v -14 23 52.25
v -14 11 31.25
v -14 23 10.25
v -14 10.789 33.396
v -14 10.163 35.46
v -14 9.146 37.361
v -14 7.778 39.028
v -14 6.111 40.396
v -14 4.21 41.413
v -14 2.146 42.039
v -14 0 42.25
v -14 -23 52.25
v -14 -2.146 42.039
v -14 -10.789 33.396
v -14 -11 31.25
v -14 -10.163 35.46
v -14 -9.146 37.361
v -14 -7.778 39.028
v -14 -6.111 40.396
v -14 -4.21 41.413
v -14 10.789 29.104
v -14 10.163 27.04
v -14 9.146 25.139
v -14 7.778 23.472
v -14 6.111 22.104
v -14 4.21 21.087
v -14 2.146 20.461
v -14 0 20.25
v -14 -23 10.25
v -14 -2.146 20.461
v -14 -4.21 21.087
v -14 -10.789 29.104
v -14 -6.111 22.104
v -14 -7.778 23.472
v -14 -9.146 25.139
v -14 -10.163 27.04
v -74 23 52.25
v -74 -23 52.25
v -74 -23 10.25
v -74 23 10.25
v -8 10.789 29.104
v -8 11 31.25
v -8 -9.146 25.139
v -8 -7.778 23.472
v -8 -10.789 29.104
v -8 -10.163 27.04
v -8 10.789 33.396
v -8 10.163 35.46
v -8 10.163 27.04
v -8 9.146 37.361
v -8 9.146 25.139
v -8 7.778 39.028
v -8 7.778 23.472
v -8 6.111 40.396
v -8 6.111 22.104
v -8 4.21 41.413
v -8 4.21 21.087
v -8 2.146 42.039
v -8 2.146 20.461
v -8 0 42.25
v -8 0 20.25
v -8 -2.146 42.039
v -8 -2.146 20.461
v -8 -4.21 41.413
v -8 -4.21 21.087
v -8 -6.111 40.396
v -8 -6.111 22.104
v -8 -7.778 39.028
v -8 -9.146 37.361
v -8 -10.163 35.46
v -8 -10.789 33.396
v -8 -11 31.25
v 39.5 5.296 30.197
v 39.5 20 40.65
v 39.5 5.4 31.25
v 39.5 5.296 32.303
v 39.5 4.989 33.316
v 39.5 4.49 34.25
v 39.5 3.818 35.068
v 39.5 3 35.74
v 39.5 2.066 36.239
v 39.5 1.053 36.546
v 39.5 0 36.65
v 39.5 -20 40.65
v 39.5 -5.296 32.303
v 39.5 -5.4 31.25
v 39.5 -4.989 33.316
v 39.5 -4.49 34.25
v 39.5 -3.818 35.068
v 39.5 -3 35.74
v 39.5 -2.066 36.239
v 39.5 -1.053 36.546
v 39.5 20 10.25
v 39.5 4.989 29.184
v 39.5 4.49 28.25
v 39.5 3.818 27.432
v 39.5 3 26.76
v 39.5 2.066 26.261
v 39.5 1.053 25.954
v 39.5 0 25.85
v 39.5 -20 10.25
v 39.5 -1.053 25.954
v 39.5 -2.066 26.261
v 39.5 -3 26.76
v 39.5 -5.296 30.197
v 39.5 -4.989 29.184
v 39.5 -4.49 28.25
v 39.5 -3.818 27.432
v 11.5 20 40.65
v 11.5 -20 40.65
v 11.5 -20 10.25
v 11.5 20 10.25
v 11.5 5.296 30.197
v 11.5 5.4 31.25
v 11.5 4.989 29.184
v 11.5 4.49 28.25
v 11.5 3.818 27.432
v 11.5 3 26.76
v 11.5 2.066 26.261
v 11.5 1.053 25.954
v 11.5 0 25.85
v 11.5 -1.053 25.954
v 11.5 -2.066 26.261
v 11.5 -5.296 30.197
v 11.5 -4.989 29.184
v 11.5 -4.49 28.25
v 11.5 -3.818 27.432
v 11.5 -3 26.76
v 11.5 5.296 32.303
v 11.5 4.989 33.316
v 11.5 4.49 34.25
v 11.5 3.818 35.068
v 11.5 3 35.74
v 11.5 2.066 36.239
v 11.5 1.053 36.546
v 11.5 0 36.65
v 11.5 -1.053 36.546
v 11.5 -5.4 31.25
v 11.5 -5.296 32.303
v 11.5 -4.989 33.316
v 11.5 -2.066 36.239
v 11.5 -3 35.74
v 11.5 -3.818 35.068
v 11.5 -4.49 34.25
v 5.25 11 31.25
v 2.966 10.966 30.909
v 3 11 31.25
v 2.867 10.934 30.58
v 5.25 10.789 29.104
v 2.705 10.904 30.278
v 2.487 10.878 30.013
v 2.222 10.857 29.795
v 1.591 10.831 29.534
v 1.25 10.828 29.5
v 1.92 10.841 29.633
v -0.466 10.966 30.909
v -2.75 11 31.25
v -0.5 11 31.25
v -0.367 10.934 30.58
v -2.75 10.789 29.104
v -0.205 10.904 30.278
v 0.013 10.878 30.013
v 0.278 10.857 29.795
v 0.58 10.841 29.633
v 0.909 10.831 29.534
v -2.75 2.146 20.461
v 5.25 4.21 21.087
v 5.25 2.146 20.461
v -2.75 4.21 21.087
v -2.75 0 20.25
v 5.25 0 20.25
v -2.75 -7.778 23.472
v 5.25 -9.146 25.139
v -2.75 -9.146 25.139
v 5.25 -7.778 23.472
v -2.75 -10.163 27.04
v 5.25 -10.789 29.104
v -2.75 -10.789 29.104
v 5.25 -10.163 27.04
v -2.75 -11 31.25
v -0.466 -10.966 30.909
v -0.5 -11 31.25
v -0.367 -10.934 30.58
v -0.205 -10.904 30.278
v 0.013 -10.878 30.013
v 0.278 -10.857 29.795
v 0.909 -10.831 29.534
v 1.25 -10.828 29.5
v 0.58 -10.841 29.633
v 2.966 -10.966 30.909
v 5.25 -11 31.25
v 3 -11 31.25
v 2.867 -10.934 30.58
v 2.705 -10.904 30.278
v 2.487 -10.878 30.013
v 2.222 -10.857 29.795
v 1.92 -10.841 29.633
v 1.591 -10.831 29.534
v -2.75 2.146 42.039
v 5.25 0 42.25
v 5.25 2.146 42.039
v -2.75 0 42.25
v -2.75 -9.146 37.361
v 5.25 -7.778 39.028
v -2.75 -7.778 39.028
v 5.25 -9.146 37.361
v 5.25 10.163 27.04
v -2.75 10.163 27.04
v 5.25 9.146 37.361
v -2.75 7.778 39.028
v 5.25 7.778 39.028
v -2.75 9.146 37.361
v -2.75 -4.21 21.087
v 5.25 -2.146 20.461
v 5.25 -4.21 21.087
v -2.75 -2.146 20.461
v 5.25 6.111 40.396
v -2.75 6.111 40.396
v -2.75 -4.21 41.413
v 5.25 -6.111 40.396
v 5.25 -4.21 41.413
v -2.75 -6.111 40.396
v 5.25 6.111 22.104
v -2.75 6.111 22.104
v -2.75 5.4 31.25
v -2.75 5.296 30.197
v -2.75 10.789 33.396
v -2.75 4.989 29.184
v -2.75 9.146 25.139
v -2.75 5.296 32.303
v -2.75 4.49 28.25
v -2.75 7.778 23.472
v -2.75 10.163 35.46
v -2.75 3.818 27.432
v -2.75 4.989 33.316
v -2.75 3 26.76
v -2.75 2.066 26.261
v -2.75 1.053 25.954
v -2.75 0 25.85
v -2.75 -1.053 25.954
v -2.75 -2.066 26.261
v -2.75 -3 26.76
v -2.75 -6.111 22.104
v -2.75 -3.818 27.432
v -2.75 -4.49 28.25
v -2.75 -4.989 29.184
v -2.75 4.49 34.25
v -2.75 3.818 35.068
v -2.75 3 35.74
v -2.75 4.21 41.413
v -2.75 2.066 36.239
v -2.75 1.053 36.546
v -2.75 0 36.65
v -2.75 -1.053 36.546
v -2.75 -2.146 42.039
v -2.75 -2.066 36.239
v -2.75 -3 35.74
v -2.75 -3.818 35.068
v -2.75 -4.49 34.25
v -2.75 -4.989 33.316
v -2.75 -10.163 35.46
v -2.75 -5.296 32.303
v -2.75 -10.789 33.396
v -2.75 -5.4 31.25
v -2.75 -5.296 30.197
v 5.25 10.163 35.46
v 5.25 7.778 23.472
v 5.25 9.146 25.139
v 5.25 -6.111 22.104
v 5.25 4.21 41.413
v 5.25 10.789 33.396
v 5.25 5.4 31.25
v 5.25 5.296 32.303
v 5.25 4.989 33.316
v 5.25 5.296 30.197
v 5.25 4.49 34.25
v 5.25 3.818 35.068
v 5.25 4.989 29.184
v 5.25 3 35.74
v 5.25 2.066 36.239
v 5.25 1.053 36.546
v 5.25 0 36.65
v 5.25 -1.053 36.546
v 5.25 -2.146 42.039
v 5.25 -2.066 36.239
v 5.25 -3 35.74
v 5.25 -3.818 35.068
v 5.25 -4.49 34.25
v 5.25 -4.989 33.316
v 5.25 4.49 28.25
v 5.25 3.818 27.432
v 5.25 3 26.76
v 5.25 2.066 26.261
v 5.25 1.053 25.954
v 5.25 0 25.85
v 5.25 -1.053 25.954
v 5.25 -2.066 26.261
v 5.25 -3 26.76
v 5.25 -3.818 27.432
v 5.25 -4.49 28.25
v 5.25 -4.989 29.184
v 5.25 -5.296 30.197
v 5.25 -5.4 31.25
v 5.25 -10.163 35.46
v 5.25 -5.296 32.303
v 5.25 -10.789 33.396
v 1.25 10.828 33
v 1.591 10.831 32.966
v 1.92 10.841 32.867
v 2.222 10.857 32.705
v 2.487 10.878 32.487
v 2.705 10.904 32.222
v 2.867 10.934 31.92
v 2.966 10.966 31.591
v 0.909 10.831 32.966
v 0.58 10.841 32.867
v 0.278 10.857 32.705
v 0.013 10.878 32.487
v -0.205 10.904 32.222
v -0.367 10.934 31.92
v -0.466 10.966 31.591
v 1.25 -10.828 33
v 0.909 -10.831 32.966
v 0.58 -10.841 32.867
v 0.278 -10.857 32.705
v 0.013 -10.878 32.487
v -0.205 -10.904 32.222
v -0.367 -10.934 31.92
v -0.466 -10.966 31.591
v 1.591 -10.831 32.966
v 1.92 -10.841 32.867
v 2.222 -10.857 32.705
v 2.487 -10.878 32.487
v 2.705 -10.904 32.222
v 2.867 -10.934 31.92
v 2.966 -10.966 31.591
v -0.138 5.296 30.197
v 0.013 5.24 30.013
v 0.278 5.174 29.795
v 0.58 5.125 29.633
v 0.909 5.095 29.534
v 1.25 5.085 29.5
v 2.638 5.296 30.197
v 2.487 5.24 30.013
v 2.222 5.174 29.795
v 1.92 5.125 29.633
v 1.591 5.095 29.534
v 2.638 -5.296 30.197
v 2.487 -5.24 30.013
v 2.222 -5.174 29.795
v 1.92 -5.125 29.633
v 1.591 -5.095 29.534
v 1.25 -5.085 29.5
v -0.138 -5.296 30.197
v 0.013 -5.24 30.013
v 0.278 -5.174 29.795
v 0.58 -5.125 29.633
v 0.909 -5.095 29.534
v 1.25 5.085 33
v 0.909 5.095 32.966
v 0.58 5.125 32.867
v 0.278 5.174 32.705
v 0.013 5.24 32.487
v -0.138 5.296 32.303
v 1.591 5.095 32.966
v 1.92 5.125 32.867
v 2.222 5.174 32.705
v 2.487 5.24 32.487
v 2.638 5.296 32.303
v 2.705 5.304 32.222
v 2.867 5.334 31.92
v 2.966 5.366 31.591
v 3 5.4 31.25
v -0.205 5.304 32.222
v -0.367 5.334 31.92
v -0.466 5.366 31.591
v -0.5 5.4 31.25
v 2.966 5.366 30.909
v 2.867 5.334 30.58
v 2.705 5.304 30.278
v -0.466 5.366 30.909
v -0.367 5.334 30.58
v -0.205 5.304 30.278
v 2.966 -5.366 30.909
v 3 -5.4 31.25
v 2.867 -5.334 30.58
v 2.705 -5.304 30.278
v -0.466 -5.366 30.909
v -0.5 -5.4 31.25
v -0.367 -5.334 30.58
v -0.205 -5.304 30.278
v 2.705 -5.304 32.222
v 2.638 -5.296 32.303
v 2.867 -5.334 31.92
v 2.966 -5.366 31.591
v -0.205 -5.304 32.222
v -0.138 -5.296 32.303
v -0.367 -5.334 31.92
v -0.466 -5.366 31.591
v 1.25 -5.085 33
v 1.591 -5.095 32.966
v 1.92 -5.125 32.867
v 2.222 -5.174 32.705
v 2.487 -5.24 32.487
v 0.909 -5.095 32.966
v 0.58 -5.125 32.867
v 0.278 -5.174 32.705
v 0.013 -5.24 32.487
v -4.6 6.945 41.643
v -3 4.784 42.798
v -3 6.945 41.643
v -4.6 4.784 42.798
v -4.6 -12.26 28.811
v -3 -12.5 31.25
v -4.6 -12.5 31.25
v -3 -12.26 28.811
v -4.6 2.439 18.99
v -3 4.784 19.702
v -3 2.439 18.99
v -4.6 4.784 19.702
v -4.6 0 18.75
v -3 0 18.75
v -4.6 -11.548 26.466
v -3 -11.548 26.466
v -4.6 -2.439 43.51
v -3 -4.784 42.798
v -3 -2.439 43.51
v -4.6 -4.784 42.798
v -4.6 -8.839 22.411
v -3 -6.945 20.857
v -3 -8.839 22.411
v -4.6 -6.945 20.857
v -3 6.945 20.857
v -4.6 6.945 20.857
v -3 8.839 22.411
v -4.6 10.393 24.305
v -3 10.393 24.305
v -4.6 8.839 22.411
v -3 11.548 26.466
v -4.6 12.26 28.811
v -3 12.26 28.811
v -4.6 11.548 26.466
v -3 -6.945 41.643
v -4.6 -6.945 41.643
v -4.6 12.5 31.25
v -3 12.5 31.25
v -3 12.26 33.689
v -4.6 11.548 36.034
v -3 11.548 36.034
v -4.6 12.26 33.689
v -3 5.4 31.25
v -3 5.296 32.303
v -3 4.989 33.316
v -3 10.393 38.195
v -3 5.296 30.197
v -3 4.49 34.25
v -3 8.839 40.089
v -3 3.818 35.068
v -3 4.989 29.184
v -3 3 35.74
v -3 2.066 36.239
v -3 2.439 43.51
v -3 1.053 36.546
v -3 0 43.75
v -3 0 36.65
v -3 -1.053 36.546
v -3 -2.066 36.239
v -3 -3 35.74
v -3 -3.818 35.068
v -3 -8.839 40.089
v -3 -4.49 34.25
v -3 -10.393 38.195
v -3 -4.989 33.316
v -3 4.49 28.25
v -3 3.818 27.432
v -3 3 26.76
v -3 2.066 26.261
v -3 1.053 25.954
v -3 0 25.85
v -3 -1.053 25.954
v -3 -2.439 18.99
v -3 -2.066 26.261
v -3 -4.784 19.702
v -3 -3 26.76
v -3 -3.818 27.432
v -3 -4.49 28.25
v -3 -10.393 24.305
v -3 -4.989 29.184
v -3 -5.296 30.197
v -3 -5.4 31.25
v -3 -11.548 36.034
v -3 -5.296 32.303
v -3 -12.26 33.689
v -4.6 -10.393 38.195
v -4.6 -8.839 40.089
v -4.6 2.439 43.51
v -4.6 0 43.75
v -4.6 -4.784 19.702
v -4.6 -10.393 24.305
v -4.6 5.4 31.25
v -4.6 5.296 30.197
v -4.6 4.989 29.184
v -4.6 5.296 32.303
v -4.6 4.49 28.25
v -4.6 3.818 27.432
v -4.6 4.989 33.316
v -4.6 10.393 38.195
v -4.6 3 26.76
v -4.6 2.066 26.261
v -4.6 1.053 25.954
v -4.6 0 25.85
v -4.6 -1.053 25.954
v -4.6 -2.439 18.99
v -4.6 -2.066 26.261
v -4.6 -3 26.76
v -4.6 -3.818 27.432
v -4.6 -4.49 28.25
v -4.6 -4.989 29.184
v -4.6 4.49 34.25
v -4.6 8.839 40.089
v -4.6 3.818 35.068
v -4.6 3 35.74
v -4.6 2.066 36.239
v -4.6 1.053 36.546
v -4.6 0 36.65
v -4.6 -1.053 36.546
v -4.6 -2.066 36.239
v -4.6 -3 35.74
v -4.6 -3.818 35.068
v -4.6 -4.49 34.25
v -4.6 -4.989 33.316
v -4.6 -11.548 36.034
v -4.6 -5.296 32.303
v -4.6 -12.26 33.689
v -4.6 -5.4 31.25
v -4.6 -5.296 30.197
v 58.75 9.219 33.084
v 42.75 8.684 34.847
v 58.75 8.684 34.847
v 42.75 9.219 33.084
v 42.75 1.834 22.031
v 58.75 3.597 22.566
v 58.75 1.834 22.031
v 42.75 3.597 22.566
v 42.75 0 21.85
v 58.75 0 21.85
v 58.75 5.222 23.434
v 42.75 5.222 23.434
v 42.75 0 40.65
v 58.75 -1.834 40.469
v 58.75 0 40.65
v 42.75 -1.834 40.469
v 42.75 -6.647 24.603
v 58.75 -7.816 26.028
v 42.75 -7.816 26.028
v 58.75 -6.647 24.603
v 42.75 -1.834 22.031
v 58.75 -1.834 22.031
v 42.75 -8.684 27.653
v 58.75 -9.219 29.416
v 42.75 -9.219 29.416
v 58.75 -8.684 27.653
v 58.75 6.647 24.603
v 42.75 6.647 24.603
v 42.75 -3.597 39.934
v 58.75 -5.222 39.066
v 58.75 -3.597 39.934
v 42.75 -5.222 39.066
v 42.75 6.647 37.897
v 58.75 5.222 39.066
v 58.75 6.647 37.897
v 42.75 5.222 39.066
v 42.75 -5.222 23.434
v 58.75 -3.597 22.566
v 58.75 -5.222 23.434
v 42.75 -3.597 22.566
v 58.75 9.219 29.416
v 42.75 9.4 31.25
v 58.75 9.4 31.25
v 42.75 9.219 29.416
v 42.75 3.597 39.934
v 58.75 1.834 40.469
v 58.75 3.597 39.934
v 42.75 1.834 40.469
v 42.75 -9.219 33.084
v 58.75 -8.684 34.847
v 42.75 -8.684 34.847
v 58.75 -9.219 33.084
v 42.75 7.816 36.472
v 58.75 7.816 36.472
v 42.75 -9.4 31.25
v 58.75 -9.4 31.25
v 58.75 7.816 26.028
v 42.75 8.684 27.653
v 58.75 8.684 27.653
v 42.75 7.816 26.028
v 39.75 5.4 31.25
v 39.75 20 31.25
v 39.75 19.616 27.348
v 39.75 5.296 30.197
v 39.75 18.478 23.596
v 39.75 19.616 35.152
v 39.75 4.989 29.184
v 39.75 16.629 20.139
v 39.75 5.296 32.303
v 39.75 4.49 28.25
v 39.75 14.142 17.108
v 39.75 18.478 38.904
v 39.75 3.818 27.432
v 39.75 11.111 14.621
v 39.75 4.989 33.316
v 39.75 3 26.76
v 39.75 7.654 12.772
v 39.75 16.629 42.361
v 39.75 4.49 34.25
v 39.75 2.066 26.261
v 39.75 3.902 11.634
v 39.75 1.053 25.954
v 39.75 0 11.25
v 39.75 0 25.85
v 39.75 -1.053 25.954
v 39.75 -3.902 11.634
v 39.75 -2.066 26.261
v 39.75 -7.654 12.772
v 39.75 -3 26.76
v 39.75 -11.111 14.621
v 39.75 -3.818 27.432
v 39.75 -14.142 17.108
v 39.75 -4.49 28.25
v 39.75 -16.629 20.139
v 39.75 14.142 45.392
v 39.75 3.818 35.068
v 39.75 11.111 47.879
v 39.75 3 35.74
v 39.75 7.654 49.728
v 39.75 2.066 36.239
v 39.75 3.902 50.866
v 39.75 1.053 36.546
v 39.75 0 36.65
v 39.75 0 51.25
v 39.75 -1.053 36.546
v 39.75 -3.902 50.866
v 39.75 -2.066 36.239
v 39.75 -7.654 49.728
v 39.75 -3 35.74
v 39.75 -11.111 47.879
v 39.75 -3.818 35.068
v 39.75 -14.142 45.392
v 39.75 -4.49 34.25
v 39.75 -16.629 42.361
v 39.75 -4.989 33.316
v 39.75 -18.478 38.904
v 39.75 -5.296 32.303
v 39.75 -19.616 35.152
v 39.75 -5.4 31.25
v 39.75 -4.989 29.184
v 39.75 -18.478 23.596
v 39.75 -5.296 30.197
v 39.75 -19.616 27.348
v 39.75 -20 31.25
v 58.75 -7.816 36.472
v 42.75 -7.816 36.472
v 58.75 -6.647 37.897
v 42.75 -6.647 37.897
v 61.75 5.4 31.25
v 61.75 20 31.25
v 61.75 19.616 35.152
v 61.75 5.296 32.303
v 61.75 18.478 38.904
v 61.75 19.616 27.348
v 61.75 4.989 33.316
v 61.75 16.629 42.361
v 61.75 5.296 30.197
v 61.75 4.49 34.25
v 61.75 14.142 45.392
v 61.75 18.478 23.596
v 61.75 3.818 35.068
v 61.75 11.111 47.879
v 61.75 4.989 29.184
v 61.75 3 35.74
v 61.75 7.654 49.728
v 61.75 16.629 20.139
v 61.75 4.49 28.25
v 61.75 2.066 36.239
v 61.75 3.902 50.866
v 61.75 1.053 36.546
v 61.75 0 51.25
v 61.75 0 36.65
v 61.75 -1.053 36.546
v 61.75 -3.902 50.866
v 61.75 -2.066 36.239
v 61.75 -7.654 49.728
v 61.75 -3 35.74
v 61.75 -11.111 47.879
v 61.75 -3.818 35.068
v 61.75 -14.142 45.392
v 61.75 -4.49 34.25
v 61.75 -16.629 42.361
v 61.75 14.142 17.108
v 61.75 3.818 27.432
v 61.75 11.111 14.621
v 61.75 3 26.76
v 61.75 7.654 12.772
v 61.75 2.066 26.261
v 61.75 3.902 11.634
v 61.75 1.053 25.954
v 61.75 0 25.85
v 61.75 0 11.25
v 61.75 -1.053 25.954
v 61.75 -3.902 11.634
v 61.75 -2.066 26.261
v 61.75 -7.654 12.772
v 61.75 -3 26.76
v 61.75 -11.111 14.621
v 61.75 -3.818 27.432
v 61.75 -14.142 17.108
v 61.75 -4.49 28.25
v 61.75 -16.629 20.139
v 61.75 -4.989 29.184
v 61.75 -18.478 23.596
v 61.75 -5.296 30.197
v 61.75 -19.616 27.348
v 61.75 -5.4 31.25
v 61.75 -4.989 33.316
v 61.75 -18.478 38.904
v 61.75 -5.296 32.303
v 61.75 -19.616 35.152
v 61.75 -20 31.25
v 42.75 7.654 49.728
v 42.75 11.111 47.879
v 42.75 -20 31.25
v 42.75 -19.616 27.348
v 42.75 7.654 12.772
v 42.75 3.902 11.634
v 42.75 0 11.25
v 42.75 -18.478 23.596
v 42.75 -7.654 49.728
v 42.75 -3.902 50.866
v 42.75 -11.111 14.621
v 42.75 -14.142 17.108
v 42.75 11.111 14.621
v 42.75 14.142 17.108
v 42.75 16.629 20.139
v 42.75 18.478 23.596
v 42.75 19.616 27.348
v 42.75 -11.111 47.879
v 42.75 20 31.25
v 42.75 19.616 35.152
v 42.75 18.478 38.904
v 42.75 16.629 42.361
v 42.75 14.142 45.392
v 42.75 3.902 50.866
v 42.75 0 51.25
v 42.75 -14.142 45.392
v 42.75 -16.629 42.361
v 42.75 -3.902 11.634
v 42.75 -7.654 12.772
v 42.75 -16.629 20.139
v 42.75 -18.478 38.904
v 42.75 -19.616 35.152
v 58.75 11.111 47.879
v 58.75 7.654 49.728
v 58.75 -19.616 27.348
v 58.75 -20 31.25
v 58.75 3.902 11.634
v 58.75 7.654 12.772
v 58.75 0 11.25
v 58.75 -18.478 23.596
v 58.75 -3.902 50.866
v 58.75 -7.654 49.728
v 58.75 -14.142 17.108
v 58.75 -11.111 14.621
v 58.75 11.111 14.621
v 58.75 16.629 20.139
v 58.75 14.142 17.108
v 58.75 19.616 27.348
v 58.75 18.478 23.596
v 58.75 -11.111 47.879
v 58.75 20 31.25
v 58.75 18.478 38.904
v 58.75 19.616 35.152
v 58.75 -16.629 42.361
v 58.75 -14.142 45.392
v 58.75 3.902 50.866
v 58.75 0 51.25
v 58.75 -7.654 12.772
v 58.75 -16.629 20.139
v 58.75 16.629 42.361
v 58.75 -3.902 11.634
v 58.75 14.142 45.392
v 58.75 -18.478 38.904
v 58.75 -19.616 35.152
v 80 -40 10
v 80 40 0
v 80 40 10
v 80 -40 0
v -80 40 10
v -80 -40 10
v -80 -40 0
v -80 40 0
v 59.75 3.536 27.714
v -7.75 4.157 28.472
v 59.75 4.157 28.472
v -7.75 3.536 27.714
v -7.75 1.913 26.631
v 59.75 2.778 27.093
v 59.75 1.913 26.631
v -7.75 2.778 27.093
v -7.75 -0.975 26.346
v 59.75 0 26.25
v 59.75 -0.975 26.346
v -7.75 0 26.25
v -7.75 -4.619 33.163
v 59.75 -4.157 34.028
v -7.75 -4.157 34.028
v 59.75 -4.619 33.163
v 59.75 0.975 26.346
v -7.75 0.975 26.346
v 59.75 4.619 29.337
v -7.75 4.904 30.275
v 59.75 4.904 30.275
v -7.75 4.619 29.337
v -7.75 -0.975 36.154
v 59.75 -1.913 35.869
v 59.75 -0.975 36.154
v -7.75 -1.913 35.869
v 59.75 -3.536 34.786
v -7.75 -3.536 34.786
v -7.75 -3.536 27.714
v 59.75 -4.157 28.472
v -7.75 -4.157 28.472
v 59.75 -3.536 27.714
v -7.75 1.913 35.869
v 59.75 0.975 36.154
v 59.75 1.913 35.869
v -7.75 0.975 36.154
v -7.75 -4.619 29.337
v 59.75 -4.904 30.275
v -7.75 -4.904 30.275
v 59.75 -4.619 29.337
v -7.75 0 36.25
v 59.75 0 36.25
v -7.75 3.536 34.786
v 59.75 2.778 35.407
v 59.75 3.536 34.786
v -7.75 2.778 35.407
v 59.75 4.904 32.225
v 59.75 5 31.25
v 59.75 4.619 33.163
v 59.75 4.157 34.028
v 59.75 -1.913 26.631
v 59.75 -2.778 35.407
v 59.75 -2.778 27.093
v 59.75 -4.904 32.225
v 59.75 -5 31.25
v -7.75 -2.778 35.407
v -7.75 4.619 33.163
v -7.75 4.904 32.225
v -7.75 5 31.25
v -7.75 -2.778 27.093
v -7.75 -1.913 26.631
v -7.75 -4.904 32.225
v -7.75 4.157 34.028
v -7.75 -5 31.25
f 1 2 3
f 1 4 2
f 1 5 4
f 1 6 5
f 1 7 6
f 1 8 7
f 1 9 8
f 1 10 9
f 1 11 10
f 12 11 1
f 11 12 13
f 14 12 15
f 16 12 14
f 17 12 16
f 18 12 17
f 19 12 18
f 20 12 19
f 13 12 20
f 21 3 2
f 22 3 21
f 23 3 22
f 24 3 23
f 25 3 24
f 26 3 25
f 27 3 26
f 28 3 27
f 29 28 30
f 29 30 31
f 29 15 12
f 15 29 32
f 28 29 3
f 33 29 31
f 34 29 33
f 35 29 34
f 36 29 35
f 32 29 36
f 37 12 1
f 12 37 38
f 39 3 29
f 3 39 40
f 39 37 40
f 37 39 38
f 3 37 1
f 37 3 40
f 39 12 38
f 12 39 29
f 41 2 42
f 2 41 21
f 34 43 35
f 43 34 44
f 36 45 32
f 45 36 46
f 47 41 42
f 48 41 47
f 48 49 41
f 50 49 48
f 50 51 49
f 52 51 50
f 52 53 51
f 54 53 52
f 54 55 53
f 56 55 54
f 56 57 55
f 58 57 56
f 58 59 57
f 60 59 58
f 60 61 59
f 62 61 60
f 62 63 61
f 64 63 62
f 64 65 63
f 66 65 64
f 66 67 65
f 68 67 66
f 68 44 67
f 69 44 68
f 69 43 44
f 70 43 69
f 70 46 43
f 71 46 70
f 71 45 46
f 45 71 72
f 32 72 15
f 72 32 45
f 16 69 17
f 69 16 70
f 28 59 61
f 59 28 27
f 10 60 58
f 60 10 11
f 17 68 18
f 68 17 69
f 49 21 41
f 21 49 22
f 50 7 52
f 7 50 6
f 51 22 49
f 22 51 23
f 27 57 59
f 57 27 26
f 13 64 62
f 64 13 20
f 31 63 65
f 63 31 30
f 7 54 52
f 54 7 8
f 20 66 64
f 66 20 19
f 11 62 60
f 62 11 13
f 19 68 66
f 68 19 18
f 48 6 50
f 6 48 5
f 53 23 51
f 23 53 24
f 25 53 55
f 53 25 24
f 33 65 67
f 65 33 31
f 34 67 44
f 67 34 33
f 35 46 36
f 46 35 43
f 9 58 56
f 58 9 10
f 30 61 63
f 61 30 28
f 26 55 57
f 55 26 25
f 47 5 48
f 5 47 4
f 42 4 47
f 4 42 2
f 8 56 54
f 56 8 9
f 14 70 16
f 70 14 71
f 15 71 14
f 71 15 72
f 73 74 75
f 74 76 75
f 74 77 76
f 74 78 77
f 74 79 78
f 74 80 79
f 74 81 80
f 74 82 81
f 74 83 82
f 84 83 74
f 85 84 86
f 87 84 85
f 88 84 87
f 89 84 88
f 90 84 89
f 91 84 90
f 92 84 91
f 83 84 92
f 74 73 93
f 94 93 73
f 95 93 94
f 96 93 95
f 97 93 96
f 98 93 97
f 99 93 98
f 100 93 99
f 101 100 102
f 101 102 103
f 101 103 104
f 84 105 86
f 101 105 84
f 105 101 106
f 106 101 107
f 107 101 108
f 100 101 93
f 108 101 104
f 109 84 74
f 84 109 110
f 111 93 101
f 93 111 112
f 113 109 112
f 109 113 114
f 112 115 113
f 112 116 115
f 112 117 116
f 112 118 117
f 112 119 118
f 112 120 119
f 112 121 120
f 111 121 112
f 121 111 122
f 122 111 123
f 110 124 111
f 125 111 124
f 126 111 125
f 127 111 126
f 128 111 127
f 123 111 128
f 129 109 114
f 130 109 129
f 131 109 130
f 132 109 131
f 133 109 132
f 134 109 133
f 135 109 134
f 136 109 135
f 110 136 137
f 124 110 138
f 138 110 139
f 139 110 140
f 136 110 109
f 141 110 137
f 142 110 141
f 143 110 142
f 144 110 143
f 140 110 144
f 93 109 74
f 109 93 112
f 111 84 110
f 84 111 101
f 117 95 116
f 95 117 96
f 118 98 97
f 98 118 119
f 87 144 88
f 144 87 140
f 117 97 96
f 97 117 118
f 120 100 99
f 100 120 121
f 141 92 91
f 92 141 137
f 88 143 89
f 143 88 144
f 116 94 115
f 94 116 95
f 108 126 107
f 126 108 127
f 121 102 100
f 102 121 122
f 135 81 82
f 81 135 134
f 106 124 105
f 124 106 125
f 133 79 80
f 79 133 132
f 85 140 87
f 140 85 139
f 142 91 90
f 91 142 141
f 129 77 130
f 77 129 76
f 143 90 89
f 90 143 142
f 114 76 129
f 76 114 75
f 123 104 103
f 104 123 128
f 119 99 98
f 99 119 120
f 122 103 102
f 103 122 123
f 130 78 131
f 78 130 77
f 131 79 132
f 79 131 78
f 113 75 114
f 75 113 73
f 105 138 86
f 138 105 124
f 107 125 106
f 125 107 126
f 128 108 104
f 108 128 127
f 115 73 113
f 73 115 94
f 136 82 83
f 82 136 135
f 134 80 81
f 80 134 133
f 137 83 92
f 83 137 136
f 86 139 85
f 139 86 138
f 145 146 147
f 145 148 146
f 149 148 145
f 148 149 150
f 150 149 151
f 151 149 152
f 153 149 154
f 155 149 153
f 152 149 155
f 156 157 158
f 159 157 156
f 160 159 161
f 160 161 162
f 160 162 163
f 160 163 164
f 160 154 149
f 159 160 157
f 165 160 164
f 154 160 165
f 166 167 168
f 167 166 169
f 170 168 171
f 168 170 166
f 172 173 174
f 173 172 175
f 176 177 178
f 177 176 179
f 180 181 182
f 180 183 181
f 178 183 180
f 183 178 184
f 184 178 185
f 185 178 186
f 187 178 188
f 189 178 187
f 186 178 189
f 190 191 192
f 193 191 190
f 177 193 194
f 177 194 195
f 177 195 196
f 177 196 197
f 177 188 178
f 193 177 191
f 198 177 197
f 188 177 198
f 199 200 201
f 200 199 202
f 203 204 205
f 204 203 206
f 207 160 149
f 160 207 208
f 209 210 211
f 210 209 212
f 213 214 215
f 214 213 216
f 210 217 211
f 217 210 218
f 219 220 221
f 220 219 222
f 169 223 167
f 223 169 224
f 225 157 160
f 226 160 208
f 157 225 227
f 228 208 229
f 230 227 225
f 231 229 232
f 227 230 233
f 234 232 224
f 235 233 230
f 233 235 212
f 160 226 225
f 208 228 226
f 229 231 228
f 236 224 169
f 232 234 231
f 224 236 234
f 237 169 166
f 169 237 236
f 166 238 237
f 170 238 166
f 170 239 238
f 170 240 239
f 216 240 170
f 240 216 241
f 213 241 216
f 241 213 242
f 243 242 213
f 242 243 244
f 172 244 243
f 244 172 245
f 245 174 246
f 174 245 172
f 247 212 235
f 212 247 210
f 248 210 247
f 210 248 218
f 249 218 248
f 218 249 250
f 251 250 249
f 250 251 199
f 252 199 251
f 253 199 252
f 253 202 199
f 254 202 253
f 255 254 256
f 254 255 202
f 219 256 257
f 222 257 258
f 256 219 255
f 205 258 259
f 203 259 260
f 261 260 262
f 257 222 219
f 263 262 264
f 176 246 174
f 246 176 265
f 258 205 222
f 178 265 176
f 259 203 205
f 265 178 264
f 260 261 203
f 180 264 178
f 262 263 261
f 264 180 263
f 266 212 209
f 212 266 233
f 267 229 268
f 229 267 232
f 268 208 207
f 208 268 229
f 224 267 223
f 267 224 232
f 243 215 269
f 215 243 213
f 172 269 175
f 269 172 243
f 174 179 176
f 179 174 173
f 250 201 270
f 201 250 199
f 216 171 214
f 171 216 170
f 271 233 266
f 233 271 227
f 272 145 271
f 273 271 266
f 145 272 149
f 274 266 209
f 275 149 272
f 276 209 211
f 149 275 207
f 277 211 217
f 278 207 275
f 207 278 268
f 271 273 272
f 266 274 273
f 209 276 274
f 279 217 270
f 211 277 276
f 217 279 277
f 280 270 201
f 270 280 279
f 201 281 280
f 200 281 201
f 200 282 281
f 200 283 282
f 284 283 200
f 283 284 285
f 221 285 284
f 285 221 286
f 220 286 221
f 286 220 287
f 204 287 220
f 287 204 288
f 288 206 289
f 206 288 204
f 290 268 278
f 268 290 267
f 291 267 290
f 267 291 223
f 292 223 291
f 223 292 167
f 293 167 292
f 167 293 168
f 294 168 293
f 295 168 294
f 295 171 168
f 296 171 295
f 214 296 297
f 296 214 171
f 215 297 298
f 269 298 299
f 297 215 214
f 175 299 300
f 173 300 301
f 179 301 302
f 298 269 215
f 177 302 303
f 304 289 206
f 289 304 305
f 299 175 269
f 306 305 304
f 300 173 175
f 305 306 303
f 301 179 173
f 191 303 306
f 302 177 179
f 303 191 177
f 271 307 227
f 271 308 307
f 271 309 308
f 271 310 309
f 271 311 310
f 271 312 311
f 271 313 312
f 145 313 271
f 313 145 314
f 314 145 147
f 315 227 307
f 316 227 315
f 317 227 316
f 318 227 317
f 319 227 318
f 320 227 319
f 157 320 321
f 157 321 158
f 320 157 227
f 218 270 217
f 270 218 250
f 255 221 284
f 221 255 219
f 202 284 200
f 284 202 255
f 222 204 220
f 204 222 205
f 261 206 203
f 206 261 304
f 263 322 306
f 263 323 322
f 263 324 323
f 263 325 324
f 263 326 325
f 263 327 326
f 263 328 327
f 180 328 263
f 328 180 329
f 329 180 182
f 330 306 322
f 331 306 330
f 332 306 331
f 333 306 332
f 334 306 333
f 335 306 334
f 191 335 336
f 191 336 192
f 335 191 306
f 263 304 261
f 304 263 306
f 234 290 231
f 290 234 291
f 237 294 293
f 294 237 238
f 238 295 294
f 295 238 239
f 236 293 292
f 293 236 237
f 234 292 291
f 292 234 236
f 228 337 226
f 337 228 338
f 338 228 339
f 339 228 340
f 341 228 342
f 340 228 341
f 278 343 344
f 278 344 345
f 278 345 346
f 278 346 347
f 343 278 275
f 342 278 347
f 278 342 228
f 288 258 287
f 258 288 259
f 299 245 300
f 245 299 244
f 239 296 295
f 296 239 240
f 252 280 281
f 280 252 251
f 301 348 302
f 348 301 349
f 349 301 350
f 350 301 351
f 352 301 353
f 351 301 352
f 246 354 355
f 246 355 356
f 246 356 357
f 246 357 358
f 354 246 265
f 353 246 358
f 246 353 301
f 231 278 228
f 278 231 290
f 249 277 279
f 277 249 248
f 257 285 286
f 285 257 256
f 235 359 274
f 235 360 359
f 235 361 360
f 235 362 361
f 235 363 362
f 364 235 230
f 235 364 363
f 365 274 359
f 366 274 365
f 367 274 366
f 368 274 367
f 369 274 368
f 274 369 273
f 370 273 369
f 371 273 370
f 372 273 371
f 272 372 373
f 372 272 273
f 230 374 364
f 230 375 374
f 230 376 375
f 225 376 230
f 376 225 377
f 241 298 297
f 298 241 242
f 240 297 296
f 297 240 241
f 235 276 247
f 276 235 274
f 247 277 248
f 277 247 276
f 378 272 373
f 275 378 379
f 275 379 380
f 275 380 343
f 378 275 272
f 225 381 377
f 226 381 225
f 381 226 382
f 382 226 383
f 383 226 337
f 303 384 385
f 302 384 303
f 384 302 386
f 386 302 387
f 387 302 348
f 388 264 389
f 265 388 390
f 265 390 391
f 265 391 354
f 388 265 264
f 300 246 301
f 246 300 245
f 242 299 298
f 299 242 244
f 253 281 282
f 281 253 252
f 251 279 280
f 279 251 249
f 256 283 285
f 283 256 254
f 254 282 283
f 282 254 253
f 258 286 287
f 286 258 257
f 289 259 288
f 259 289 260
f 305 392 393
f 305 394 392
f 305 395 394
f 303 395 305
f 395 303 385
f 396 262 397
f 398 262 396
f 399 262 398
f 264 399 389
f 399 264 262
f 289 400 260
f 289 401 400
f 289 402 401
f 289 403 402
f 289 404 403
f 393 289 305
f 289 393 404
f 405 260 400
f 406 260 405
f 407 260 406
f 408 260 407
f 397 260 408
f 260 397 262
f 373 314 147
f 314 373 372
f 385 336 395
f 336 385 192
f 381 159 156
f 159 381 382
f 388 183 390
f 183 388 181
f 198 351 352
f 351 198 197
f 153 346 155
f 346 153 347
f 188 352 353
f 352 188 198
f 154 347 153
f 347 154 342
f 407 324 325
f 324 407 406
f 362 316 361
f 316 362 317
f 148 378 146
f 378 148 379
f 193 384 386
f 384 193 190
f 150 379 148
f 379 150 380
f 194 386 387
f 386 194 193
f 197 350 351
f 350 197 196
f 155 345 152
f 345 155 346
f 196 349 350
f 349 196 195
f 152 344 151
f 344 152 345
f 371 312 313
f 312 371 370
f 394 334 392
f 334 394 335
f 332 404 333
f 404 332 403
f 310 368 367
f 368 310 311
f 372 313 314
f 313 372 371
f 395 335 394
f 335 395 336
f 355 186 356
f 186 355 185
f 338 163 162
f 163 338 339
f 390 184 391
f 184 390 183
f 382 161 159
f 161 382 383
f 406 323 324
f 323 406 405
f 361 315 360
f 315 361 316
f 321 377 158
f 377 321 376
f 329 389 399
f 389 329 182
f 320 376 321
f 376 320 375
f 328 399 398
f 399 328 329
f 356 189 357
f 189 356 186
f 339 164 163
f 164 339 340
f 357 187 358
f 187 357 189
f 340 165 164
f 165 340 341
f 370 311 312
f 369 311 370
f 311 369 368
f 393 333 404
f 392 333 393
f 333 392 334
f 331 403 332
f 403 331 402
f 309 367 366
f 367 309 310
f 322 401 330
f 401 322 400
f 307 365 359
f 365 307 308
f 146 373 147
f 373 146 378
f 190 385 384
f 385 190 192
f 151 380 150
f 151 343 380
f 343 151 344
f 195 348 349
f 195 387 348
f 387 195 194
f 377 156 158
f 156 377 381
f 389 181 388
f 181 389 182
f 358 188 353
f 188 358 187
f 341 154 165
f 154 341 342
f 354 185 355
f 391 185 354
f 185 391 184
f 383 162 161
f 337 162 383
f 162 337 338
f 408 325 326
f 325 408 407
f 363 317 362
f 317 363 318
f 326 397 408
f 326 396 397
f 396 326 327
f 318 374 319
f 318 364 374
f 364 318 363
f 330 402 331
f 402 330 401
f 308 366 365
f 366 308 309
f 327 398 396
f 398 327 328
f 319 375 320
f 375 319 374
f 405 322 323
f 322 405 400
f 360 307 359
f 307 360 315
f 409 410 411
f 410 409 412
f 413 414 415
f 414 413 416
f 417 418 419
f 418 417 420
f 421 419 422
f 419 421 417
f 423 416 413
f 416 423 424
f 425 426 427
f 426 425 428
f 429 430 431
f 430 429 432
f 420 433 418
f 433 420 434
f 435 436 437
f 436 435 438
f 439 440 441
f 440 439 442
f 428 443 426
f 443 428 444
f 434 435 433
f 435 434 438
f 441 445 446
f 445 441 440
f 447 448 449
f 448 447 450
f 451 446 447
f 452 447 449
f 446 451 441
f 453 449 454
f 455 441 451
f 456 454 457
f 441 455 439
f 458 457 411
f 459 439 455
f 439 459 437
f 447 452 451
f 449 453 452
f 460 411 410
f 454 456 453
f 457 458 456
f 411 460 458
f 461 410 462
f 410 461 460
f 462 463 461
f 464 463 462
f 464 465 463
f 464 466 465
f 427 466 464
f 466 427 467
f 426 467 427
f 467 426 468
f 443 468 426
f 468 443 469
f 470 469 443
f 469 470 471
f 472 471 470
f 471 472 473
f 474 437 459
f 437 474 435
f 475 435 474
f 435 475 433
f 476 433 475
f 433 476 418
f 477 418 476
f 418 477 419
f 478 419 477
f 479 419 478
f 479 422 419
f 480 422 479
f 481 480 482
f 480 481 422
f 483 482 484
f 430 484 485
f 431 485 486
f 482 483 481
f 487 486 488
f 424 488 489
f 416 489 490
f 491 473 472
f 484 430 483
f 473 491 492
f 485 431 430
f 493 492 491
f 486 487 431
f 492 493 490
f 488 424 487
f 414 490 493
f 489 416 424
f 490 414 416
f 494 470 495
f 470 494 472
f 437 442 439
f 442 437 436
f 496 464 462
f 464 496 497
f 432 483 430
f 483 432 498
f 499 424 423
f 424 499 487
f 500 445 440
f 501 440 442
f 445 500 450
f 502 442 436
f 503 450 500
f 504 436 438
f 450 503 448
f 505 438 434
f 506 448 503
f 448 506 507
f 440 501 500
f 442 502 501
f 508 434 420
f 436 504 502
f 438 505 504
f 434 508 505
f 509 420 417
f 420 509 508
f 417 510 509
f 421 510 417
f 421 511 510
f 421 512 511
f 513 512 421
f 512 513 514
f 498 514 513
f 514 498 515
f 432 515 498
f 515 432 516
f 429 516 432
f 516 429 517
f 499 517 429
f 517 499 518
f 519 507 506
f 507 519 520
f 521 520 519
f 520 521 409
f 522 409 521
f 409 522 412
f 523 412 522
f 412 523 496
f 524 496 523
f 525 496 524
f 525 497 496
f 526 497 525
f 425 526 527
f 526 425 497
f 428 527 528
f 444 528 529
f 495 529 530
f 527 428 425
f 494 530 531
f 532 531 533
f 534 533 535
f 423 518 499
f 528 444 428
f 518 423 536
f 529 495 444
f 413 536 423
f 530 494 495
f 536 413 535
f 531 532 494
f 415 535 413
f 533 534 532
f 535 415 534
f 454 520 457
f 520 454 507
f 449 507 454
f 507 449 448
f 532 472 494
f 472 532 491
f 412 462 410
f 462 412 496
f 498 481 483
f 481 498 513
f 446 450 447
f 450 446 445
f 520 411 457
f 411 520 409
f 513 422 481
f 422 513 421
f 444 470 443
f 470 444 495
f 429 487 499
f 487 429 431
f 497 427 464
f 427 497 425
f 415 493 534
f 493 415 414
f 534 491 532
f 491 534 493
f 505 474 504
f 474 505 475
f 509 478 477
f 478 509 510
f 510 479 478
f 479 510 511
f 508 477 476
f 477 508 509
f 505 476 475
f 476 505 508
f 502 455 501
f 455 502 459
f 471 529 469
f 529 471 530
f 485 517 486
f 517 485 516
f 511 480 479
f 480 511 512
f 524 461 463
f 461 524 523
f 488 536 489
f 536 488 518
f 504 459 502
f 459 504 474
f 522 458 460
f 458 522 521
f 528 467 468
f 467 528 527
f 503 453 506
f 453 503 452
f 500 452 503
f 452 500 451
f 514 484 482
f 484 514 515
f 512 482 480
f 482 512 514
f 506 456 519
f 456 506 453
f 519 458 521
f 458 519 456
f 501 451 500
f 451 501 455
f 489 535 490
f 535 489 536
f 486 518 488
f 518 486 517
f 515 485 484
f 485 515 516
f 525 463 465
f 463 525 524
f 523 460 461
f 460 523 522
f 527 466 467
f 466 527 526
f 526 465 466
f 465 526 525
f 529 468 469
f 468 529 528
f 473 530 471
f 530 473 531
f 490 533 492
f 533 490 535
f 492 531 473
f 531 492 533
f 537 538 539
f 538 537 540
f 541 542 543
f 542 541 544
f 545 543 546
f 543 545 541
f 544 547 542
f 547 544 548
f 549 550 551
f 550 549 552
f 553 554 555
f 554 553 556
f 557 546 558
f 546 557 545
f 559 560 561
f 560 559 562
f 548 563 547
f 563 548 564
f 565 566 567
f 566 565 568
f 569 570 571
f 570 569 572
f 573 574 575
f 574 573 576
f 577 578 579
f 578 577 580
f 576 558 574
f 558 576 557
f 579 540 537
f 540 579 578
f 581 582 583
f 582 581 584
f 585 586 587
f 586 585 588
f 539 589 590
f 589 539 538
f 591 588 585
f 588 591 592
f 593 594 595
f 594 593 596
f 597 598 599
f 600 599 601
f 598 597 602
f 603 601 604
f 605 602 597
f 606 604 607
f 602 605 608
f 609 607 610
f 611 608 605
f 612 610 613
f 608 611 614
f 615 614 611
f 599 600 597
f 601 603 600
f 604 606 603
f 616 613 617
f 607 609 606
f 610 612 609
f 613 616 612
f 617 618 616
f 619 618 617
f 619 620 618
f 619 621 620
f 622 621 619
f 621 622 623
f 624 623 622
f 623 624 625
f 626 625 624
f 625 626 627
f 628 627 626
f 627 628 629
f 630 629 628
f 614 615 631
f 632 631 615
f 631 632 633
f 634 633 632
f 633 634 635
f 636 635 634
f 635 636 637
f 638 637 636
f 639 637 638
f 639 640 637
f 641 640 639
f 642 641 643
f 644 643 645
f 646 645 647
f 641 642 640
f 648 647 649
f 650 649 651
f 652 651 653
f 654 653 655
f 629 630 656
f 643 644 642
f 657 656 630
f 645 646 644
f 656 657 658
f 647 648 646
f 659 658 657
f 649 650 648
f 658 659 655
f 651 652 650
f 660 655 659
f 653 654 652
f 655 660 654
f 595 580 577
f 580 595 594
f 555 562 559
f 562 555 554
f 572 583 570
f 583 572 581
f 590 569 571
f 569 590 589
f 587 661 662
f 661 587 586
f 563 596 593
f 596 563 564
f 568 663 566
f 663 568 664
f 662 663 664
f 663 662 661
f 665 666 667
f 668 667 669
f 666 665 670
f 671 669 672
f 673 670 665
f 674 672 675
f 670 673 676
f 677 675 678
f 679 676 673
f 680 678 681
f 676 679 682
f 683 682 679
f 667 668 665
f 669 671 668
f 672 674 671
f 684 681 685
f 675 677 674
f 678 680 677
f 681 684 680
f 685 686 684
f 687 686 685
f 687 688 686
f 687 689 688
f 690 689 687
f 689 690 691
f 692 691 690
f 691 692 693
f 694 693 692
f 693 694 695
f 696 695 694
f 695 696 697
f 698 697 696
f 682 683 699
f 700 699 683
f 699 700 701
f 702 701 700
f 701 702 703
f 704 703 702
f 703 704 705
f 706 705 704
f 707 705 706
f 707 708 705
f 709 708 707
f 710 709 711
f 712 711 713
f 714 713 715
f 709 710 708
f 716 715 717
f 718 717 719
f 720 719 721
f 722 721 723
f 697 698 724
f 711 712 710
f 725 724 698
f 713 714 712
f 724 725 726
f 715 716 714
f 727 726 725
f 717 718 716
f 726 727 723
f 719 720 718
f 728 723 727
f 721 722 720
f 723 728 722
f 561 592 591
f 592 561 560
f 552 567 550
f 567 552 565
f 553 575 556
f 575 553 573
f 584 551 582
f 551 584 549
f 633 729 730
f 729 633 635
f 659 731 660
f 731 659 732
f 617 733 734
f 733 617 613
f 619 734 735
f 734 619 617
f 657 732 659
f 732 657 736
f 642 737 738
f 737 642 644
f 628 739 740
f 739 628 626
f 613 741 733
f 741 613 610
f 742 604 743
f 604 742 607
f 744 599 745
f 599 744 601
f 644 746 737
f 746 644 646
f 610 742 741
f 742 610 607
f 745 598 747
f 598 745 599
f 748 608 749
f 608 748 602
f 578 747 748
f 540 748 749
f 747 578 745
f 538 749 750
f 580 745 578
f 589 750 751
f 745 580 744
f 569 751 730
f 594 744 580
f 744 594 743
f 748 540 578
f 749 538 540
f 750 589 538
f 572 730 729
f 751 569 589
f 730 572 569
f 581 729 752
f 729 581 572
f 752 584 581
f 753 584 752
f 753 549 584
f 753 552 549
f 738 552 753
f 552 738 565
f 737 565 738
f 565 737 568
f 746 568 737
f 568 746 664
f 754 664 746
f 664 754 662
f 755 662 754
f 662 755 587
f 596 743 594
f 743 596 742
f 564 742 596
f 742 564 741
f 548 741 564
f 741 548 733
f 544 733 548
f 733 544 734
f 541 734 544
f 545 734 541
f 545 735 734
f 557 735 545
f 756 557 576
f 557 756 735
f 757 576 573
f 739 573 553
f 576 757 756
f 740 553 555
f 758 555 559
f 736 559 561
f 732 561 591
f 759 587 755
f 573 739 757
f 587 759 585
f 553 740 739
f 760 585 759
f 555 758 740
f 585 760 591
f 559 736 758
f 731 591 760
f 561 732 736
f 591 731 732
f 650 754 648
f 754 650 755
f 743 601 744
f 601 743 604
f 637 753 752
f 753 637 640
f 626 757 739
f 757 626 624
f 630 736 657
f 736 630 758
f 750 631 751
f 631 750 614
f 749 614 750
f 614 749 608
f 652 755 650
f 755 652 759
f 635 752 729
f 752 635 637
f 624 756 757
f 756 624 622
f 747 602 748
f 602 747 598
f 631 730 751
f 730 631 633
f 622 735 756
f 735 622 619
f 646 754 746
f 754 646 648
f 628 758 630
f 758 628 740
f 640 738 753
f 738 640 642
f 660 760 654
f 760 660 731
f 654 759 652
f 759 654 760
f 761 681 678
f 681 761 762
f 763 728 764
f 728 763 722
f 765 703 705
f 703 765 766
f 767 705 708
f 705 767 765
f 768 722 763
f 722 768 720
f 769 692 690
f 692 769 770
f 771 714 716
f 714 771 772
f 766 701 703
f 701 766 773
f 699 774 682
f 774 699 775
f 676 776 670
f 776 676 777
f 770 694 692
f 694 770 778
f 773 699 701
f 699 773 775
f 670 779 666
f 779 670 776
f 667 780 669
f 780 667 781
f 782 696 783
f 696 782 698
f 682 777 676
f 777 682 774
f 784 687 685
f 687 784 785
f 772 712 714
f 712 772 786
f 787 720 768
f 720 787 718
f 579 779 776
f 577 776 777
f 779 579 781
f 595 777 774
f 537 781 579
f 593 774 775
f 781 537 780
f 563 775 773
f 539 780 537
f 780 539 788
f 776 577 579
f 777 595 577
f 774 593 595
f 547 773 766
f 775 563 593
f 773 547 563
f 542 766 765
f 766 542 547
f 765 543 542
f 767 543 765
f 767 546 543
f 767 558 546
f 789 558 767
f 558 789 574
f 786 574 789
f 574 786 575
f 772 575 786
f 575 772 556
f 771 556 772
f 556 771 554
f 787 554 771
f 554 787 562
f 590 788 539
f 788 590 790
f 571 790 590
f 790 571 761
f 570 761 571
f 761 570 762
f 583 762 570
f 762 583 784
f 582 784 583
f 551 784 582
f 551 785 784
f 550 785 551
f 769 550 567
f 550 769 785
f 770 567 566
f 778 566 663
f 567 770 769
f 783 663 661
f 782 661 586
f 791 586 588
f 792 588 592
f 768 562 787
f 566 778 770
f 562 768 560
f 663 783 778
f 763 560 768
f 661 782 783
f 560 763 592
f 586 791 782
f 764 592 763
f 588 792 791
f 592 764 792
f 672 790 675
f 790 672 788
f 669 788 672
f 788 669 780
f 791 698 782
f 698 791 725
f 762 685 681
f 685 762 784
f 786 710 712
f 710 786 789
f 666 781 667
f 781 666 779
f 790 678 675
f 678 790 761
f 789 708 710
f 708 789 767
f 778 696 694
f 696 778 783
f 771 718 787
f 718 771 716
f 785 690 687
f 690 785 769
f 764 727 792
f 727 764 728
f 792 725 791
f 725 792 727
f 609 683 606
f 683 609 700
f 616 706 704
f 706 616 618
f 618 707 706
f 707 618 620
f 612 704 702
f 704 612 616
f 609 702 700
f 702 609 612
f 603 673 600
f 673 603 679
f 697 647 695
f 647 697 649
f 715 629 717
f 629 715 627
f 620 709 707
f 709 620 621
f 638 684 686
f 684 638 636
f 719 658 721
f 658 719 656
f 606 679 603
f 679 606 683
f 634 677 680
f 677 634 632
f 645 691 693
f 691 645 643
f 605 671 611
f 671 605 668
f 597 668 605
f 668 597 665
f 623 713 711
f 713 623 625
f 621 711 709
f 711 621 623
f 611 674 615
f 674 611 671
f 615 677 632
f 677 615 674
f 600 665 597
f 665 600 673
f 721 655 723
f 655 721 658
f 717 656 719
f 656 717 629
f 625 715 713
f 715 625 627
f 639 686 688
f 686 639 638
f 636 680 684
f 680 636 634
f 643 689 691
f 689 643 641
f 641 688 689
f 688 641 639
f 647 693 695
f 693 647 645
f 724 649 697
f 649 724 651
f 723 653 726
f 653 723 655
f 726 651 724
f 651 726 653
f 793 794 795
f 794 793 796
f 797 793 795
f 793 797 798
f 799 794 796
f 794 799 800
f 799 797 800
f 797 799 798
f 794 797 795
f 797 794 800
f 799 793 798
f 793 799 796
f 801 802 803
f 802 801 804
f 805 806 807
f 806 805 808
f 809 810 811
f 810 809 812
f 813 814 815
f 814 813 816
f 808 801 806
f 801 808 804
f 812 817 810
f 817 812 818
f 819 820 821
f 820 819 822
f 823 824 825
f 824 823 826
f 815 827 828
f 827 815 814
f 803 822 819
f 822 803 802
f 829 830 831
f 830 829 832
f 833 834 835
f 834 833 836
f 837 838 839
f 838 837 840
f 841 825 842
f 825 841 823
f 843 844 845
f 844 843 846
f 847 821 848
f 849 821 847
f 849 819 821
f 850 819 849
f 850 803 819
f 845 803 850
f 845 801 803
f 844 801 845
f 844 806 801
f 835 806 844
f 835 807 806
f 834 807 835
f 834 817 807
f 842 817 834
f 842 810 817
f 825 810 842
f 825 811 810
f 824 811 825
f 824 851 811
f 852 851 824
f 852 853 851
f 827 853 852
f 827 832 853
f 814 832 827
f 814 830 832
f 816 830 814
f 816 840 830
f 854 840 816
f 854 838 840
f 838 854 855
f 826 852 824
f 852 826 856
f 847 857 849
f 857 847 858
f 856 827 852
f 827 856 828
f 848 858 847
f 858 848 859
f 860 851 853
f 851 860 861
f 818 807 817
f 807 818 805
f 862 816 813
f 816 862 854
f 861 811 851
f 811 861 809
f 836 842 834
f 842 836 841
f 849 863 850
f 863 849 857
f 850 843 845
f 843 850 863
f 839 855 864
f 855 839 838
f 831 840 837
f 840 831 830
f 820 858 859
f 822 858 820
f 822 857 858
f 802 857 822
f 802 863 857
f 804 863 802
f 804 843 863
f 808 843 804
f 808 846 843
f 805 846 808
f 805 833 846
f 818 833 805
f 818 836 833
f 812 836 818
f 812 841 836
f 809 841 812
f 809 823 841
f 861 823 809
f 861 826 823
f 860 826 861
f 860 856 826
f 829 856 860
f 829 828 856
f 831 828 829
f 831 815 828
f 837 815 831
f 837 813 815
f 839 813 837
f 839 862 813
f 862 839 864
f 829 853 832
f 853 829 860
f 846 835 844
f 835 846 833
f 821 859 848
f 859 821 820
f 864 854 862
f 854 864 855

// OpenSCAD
$fn = 32;

// ------------------------------------------------------------------------
// Motor drive station: motor 60 x 42 mm, shaft d10, pulley d40
// Every part is its own module, assembly() places every instance.
// ------------------------------------------------------------------------

// --- part 1 ---
module station_bed() {
  difference() {
    translate([-80, -40, 0]) cube([160, 80, 10]);
  }
}

// --- part 2 ---
module drive_motor() {
  union() {
    translate([-30, -23, 0]) cube([60, 46, 42]);
    translate([33, 0, 21]) rotate([0, 90, 0]) cylinder(h = 6, d = 22, center = true);
  }
}

// --- part 3 ---
module pillow_block() {
  difference() {
    translate([-14, -20, 0]) cube([28, 40, 30.4]);
    translate([0, 0, 21]) rotate([0, 90, 0]) cylinder(h = 30, d = 10.8, center = true);
  }
}

// --- part 4 ---
module drive_shaft() {
  translate([0, 0, -33.75]) cylinder(h = 67.5, d = 10);
}

// --- part 5 ---
module shaft_collar() {
  difference() {
    cylinder(h = 8, d = 22);
    translate([0, 0, -1]) cylinder(h = 10, d = 10.8);
    translate([0, 0, 4]) rotate([90, 0, 0]) cylinder(h = 24, d = 3.5, center = true);
  }
}

// --- part 6 ---
module collar_washer() {
  difference() {
      translate([0, 0, 0]) cylinder(h = 1.6, d = 25);
      translate([0, 0, -1]) cylinder(h = 3.6, d = 10.8);
    }
}

// --- part 7 ---
module drive_pulley() {
  difference() {
    union() {
      cylinder(h = 22, d = 18.8);
      cylinder(h = 3, d = 40);
      translate([0, 0, 19]) cylinder(h = 3, d = 40);
    }
    translate([0, 0, -1]) cylinder(h = 24, d = 10.8);
  }
}

// --- assembly ---
module assembly() {
  color([0.80, 0.24, 0.20]) translate([0, 0, 0]) rotate([0, 0, 0]) station_bed();
  color([0.20, 0.45, 0.75]) translate([-44, 0, 10.25]) rotate([0, 0, 0]) drive_motor();
  color([0.25, 0.62, 0.32]) translate([25.5, 0, 10.25]) rotate([0, 0, 0]) pillow_block();
  color([0.92, 0.70, 0.18]) translate([26, 0, 31.25]) rotate([0, 90, 0]) drive_shaft();
  color([0.58, 0.35, 0.70]) translate([-2.75, 0, 31.25]) rotate([0, 90, 0]) shaft_collar();
  color([0.16, 0.66, 0.66]) translate([-4.6, 0, 31.25]) rotate([0, 90, 0]) collar_washer();
  color([0.85, 0.48, 0.18]) translate([39.75, 0, 31.25]) rotate([0, 90, 0]) drive_pulley();
}

assembly();
